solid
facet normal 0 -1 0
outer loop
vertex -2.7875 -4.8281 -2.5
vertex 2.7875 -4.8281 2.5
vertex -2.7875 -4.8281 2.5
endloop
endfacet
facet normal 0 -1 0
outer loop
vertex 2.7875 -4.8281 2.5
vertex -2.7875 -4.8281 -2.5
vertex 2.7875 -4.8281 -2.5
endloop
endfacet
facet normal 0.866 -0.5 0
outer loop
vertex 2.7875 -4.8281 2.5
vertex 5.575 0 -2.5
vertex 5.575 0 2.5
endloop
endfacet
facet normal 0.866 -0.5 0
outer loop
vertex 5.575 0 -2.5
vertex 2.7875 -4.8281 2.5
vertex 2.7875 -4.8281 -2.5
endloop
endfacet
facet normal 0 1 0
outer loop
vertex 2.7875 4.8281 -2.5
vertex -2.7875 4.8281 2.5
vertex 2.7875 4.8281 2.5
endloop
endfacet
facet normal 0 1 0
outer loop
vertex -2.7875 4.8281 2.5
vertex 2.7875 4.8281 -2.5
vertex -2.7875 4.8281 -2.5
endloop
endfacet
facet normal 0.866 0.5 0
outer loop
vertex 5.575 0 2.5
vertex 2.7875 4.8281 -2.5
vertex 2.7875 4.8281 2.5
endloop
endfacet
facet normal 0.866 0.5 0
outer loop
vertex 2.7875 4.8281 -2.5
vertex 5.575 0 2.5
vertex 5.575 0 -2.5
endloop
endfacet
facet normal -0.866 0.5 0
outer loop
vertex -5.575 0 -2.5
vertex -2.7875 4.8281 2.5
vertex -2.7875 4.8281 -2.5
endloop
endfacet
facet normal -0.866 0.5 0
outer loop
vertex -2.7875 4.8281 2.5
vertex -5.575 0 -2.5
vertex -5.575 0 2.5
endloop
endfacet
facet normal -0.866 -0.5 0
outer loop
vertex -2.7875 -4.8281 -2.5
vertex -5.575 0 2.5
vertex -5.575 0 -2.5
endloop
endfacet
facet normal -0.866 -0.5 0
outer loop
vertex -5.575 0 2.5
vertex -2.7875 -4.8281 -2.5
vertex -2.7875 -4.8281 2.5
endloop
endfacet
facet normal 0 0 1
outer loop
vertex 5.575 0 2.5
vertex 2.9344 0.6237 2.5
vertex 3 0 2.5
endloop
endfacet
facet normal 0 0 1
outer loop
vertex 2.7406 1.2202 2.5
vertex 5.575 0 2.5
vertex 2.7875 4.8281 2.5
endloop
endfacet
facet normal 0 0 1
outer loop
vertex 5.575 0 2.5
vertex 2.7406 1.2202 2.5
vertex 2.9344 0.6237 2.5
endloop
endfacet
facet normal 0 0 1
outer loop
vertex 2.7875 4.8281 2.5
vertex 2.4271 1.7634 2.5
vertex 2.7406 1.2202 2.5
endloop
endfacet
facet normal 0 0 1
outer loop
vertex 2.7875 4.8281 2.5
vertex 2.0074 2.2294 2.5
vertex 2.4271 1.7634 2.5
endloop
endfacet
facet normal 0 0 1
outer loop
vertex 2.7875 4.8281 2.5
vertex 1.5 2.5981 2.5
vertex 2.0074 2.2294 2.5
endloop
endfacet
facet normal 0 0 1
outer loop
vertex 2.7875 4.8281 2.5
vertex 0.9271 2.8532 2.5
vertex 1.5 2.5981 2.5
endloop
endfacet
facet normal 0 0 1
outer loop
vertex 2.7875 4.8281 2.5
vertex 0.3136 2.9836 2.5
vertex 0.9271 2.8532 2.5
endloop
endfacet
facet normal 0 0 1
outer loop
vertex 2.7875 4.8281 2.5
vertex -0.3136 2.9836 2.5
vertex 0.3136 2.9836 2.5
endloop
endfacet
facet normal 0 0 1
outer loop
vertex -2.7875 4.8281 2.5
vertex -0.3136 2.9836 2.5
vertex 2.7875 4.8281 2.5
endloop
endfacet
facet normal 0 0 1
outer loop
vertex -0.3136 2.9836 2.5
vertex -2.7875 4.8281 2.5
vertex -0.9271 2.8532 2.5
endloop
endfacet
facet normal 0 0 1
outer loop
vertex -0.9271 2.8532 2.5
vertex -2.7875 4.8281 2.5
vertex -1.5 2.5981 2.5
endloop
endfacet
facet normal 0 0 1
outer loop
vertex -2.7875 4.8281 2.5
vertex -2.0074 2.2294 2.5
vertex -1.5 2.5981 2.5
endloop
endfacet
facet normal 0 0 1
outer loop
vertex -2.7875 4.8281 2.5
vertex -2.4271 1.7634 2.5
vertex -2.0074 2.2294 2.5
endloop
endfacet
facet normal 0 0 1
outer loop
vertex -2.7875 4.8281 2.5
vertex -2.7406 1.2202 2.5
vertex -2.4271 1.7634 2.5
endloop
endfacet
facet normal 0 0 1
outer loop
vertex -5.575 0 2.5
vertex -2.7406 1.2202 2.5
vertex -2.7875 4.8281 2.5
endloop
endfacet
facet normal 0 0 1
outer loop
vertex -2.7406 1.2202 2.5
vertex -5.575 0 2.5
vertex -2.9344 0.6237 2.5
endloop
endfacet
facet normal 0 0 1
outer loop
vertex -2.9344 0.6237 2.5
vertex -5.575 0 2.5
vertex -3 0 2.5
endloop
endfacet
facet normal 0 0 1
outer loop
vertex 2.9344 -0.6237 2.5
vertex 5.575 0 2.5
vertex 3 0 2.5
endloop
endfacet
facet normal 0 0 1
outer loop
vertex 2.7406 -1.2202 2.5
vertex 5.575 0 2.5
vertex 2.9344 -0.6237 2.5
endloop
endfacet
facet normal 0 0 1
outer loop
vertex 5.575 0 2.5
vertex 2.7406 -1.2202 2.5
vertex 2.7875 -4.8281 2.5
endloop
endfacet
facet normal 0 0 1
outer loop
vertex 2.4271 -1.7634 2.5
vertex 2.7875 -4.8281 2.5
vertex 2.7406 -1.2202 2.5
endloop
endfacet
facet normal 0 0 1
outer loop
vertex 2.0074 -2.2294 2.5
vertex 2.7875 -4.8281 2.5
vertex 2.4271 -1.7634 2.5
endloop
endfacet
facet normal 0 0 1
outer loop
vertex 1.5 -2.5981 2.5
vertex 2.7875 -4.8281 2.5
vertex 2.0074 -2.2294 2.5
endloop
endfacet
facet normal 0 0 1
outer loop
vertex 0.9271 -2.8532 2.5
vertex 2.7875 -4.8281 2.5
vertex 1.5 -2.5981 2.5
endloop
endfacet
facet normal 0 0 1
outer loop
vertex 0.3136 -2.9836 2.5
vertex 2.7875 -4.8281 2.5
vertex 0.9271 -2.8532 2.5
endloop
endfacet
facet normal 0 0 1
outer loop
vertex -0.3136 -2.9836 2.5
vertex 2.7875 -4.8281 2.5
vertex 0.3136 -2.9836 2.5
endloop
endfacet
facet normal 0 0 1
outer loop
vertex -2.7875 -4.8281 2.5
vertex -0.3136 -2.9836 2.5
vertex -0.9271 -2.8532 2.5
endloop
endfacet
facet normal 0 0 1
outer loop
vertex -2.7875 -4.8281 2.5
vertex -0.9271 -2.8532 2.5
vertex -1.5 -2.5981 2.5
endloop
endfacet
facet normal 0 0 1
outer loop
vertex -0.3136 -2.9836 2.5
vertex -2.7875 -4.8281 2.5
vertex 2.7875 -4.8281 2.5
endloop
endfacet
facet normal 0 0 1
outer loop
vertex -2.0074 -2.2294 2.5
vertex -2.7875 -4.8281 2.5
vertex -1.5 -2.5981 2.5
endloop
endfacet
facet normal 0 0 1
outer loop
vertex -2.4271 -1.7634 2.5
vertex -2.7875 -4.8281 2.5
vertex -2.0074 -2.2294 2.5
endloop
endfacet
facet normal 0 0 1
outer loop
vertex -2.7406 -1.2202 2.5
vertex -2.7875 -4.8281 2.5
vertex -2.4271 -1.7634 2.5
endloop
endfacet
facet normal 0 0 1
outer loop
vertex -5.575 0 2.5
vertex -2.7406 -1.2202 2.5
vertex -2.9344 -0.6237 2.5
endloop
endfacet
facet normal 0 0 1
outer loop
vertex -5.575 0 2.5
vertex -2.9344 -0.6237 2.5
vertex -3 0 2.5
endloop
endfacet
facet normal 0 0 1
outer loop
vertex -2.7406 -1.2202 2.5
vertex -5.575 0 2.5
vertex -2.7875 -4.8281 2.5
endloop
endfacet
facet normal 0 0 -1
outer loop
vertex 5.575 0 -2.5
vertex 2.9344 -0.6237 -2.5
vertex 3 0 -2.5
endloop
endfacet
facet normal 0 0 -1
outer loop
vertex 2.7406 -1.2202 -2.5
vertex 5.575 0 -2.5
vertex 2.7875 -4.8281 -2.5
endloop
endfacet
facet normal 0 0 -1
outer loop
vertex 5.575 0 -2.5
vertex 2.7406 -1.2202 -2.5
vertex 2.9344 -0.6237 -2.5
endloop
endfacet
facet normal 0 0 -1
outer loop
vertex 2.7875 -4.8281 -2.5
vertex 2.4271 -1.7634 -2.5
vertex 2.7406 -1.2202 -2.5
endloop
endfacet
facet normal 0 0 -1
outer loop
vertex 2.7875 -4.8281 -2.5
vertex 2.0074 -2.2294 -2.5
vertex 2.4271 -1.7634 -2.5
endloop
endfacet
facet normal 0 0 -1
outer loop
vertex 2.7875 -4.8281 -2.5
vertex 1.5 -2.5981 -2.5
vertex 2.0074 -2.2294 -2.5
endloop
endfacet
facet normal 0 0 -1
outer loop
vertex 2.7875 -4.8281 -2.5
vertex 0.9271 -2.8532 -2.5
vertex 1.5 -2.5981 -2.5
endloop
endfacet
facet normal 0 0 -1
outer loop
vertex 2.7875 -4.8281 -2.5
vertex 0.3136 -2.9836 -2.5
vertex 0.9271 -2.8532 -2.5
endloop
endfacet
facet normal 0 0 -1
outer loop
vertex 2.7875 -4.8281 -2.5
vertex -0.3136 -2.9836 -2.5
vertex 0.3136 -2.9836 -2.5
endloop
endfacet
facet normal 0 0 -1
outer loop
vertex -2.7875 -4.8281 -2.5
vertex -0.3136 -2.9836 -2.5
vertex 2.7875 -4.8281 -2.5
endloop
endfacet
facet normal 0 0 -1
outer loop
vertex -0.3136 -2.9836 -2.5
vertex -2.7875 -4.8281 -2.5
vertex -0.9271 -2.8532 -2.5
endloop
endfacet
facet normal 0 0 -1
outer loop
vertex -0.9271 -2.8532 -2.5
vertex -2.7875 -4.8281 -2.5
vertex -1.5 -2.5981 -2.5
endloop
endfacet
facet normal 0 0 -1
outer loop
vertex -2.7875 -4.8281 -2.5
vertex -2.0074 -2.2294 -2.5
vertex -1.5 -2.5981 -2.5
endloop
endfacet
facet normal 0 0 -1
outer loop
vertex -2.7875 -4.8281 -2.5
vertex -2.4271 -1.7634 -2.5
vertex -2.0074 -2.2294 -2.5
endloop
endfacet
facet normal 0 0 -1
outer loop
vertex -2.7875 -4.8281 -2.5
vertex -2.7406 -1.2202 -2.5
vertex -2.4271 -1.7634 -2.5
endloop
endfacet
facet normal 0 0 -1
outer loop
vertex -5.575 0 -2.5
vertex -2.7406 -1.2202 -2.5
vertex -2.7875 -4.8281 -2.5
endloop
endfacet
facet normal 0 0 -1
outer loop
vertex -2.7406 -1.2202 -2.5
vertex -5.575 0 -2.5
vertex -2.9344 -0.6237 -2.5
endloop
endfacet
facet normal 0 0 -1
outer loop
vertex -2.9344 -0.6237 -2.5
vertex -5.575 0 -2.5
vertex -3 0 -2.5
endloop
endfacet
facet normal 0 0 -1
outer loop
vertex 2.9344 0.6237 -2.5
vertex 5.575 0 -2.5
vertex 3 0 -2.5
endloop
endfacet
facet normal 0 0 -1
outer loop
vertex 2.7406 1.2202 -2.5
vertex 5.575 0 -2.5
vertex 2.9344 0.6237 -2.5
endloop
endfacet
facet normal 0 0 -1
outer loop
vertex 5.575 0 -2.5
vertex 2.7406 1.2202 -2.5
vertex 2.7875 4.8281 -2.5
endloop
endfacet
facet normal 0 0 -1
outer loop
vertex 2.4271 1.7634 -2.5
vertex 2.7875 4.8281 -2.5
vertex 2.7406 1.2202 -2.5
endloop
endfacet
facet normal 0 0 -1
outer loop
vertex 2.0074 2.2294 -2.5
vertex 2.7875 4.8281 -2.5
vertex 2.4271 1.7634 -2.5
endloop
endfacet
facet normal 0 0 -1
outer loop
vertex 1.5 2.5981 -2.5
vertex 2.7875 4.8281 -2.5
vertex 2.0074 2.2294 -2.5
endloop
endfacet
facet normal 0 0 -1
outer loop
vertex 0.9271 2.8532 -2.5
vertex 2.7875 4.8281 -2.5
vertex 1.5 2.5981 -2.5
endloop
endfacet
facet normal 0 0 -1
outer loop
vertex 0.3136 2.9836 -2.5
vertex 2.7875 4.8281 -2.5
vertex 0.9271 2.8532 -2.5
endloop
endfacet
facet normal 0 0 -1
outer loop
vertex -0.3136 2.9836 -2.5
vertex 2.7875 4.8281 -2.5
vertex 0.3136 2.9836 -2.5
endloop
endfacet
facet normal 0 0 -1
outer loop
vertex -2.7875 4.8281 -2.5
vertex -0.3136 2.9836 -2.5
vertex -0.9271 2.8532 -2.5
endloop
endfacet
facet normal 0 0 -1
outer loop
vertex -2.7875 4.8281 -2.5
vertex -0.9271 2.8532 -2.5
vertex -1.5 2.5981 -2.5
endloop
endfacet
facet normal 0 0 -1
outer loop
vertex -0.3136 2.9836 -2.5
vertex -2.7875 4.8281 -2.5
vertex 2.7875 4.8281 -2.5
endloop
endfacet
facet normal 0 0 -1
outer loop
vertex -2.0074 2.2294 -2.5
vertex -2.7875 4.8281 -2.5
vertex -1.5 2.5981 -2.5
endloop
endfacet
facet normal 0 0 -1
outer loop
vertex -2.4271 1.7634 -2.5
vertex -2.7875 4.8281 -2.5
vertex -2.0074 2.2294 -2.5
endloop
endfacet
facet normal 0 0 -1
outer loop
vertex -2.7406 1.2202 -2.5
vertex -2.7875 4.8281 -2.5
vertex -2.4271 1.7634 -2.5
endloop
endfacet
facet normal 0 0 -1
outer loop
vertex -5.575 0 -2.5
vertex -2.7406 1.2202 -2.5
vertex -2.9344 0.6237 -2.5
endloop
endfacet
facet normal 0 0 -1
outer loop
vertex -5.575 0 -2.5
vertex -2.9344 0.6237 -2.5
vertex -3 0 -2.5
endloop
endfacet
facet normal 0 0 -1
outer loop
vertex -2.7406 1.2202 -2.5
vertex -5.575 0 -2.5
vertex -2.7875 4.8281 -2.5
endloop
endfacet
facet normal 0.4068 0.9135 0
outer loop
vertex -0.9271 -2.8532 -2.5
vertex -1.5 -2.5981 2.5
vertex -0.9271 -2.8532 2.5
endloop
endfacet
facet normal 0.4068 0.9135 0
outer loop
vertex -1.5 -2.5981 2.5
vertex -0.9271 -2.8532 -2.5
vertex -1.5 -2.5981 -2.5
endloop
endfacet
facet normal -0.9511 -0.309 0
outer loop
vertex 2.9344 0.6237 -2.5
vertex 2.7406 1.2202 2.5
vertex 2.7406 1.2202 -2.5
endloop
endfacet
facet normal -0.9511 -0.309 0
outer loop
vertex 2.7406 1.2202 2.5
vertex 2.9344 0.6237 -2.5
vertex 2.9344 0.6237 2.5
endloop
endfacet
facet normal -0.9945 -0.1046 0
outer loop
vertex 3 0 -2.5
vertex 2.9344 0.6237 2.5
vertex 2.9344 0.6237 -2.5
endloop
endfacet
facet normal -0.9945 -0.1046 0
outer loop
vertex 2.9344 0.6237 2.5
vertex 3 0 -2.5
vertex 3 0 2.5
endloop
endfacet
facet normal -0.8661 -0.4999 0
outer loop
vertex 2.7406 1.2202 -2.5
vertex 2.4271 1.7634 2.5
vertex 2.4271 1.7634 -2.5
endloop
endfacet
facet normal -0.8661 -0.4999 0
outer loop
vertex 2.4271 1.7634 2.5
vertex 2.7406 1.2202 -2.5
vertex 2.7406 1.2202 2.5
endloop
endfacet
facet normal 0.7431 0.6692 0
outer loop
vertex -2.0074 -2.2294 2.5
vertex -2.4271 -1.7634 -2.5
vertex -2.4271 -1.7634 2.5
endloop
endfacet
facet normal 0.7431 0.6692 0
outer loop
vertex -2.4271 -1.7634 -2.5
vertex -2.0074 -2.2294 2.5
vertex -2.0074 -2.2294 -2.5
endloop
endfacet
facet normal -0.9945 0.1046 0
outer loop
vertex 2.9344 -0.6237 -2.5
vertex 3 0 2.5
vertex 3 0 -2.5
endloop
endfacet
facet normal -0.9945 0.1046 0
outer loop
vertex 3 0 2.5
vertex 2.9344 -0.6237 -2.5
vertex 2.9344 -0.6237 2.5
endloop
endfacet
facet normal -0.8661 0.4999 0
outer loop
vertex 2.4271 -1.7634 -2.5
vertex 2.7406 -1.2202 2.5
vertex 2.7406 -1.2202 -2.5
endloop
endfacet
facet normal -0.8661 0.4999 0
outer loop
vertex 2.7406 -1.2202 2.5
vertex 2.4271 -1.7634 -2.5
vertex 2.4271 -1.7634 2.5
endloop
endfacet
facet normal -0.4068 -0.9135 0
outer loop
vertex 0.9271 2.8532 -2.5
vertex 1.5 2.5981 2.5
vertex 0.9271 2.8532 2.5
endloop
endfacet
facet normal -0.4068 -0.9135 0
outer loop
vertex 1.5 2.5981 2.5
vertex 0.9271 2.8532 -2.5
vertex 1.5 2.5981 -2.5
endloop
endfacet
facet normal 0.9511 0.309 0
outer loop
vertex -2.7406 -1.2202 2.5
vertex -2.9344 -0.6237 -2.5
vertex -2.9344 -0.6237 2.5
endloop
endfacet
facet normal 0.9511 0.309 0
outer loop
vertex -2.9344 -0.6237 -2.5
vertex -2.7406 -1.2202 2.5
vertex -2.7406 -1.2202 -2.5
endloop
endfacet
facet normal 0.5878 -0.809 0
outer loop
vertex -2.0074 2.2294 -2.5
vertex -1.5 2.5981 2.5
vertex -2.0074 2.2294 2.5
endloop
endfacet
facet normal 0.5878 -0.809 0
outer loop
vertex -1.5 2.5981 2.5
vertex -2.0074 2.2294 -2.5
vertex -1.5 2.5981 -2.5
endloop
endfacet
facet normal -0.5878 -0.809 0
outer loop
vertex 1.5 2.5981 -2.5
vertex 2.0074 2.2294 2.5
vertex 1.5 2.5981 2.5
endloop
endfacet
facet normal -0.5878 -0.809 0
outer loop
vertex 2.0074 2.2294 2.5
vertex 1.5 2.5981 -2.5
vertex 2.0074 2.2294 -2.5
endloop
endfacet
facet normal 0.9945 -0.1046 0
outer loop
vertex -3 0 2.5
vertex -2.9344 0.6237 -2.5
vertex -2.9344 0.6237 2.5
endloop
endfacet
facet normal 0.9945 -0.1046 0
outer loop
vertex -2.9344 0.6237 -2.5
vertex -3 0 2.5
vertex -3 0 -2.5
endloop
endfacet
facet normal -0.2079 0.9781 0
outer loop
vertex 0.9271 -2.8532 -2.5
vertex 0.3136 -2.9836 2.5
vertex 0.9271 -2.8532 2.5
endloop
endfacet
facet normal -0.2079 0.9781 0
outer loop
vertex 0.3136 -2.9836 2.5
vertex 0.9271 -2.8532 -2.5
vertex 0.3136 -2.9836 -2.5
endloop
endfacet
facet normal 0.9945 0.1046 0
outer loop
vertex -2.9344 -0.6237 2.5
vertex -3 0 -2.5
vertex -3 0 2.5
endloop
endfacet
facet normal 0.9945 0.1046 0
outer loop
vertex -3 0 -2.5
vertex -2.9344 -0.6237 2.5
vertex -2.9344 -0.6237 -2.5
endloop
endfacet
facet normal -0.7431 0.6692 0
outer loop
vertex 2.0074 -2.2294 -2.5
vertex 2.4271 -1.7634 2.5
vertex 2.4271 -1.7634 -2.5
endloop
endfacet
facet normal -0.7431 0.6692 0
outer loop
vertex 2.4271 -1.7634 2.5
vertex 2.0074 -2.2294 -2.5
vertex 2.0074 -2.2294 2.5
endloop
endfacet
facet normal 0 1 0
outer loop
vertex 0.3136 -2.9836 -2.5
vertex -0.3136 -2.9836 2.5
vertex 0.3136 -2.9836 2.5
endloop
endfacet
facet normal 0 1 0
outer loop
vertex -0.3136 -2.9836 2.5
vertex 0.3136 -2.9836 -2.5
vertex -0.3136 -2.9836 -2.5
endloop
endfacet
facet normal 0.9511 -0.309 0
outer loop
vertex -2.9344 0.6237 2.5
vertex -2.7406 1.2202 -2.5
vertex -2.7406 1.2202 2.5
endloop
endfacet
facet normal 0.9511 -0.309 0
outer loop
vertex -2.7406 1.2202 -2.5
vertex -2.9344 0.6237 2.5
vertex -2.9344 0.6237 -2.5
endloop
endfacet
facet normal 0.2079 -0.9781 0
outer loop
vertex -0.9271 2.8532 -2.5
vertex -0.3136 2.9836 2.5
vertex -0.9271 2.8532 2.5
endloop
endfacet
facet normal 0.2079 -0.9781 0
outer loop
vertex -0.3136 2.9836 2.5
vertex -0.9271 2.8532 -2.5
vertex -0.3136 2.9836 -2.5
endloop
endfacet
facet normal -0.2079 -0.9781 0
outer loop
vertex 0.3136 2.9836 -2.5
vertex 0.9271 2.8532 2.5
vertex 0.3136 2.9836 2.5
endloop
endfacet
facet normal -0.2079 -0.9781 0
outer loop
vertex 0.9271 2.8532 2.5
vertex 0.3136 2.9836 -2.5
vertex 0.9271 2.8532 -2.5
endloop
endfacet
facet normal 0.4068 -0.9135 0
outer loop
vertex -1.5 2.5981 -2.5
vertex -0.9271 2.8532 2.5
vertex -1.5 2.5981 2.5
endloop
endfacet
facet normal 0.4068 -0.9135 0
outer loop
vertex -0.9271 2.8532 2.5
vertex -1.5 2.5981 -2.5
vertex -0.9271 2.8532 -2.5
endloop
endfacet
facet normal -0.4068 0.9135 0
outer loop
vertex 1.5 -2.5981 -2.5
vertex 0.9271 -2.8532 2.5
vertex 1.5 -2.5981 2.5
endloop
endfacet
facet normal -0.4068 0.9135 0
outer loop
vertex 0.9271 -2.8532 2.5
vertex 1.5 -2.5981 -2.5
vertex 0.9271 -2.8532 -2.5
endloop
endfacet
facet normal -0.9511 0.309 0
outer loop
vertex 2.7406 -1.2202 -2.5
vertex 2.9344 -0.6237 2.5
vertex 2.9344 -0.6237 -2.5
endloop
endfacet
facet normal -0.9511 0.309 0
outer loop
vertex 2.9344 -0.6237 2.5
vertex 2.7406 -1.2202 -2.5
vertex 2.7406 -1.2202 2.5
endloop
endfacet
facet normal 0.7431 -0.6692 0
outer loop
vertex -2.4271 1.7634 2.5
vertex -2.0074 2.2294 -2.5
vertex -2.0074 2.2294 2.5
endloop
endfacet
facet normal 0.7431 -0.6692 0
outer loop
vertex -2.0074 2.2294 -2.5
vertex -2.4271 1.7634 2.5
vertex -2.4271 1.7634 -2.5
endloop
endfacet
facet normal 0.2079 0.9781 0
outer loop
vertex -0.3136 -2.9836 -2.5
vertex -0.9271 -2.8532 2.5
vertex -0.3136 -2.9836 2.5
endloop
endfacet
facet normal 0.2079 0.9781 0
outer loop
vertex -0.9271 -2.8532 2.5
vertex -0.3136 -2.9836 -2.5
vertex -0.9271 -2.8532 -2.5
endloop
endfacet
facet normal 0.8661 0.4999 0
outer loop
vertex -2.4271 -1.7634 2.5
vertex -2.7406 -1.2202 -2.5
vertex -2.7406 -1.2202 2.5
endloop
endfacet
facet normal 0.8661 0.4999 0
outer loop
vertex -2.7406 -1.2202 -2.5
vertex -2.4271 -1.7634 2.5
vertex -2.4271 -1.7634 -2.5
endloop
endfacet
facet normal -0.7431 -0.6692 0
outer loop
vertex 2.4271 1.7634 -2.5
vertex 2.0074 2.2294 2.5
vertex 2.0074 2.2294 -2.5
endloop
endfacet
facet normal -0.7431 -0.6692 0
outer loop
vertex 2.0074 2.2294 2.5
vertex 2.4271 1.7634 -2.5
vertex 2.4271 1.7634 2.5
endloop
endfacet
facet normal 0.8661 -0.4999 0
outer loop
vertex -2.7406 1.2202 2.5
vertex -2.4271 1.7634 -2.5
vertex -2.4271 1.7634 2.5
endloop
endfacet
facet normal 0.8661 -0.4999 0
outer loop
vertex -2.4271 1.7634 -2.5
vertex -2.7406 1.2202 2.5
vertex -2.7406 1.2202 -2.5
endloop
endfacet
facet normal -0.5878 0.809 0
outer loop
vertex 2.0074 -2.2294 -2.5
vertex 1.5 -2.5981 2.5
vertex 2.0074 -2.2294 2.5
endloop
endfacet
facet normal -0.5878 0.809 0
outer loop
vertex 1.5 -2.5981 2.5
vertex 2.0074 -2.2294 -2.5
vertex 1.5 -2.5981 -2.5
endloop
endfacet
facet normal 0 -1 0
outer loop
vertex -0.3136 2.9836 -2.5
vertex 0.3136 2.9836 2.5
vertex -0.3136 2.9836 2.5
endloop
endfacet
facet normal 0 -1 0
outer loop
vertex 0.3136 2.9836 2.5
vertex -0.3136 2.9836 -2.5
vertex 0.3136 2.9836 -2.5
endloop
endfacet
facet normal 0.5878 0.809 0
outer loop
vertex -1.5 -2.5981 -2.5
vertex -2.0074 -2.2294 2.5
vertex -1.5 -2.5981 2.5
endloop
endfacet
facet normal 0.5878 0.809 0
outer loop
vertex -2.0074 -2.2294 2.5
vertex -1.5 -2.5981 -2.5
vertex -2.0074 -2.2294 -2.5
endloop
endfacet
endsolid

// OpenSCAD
D = 21.6;
d = 11.72;
H = 11.27;

D = 11.15;
d = 6;
H = 5;

difference(){
  cylinder(d=D, h=H, $fn=6, center=true);
  cylinder(d=d, h=100, center=true, $fn=30);
}
